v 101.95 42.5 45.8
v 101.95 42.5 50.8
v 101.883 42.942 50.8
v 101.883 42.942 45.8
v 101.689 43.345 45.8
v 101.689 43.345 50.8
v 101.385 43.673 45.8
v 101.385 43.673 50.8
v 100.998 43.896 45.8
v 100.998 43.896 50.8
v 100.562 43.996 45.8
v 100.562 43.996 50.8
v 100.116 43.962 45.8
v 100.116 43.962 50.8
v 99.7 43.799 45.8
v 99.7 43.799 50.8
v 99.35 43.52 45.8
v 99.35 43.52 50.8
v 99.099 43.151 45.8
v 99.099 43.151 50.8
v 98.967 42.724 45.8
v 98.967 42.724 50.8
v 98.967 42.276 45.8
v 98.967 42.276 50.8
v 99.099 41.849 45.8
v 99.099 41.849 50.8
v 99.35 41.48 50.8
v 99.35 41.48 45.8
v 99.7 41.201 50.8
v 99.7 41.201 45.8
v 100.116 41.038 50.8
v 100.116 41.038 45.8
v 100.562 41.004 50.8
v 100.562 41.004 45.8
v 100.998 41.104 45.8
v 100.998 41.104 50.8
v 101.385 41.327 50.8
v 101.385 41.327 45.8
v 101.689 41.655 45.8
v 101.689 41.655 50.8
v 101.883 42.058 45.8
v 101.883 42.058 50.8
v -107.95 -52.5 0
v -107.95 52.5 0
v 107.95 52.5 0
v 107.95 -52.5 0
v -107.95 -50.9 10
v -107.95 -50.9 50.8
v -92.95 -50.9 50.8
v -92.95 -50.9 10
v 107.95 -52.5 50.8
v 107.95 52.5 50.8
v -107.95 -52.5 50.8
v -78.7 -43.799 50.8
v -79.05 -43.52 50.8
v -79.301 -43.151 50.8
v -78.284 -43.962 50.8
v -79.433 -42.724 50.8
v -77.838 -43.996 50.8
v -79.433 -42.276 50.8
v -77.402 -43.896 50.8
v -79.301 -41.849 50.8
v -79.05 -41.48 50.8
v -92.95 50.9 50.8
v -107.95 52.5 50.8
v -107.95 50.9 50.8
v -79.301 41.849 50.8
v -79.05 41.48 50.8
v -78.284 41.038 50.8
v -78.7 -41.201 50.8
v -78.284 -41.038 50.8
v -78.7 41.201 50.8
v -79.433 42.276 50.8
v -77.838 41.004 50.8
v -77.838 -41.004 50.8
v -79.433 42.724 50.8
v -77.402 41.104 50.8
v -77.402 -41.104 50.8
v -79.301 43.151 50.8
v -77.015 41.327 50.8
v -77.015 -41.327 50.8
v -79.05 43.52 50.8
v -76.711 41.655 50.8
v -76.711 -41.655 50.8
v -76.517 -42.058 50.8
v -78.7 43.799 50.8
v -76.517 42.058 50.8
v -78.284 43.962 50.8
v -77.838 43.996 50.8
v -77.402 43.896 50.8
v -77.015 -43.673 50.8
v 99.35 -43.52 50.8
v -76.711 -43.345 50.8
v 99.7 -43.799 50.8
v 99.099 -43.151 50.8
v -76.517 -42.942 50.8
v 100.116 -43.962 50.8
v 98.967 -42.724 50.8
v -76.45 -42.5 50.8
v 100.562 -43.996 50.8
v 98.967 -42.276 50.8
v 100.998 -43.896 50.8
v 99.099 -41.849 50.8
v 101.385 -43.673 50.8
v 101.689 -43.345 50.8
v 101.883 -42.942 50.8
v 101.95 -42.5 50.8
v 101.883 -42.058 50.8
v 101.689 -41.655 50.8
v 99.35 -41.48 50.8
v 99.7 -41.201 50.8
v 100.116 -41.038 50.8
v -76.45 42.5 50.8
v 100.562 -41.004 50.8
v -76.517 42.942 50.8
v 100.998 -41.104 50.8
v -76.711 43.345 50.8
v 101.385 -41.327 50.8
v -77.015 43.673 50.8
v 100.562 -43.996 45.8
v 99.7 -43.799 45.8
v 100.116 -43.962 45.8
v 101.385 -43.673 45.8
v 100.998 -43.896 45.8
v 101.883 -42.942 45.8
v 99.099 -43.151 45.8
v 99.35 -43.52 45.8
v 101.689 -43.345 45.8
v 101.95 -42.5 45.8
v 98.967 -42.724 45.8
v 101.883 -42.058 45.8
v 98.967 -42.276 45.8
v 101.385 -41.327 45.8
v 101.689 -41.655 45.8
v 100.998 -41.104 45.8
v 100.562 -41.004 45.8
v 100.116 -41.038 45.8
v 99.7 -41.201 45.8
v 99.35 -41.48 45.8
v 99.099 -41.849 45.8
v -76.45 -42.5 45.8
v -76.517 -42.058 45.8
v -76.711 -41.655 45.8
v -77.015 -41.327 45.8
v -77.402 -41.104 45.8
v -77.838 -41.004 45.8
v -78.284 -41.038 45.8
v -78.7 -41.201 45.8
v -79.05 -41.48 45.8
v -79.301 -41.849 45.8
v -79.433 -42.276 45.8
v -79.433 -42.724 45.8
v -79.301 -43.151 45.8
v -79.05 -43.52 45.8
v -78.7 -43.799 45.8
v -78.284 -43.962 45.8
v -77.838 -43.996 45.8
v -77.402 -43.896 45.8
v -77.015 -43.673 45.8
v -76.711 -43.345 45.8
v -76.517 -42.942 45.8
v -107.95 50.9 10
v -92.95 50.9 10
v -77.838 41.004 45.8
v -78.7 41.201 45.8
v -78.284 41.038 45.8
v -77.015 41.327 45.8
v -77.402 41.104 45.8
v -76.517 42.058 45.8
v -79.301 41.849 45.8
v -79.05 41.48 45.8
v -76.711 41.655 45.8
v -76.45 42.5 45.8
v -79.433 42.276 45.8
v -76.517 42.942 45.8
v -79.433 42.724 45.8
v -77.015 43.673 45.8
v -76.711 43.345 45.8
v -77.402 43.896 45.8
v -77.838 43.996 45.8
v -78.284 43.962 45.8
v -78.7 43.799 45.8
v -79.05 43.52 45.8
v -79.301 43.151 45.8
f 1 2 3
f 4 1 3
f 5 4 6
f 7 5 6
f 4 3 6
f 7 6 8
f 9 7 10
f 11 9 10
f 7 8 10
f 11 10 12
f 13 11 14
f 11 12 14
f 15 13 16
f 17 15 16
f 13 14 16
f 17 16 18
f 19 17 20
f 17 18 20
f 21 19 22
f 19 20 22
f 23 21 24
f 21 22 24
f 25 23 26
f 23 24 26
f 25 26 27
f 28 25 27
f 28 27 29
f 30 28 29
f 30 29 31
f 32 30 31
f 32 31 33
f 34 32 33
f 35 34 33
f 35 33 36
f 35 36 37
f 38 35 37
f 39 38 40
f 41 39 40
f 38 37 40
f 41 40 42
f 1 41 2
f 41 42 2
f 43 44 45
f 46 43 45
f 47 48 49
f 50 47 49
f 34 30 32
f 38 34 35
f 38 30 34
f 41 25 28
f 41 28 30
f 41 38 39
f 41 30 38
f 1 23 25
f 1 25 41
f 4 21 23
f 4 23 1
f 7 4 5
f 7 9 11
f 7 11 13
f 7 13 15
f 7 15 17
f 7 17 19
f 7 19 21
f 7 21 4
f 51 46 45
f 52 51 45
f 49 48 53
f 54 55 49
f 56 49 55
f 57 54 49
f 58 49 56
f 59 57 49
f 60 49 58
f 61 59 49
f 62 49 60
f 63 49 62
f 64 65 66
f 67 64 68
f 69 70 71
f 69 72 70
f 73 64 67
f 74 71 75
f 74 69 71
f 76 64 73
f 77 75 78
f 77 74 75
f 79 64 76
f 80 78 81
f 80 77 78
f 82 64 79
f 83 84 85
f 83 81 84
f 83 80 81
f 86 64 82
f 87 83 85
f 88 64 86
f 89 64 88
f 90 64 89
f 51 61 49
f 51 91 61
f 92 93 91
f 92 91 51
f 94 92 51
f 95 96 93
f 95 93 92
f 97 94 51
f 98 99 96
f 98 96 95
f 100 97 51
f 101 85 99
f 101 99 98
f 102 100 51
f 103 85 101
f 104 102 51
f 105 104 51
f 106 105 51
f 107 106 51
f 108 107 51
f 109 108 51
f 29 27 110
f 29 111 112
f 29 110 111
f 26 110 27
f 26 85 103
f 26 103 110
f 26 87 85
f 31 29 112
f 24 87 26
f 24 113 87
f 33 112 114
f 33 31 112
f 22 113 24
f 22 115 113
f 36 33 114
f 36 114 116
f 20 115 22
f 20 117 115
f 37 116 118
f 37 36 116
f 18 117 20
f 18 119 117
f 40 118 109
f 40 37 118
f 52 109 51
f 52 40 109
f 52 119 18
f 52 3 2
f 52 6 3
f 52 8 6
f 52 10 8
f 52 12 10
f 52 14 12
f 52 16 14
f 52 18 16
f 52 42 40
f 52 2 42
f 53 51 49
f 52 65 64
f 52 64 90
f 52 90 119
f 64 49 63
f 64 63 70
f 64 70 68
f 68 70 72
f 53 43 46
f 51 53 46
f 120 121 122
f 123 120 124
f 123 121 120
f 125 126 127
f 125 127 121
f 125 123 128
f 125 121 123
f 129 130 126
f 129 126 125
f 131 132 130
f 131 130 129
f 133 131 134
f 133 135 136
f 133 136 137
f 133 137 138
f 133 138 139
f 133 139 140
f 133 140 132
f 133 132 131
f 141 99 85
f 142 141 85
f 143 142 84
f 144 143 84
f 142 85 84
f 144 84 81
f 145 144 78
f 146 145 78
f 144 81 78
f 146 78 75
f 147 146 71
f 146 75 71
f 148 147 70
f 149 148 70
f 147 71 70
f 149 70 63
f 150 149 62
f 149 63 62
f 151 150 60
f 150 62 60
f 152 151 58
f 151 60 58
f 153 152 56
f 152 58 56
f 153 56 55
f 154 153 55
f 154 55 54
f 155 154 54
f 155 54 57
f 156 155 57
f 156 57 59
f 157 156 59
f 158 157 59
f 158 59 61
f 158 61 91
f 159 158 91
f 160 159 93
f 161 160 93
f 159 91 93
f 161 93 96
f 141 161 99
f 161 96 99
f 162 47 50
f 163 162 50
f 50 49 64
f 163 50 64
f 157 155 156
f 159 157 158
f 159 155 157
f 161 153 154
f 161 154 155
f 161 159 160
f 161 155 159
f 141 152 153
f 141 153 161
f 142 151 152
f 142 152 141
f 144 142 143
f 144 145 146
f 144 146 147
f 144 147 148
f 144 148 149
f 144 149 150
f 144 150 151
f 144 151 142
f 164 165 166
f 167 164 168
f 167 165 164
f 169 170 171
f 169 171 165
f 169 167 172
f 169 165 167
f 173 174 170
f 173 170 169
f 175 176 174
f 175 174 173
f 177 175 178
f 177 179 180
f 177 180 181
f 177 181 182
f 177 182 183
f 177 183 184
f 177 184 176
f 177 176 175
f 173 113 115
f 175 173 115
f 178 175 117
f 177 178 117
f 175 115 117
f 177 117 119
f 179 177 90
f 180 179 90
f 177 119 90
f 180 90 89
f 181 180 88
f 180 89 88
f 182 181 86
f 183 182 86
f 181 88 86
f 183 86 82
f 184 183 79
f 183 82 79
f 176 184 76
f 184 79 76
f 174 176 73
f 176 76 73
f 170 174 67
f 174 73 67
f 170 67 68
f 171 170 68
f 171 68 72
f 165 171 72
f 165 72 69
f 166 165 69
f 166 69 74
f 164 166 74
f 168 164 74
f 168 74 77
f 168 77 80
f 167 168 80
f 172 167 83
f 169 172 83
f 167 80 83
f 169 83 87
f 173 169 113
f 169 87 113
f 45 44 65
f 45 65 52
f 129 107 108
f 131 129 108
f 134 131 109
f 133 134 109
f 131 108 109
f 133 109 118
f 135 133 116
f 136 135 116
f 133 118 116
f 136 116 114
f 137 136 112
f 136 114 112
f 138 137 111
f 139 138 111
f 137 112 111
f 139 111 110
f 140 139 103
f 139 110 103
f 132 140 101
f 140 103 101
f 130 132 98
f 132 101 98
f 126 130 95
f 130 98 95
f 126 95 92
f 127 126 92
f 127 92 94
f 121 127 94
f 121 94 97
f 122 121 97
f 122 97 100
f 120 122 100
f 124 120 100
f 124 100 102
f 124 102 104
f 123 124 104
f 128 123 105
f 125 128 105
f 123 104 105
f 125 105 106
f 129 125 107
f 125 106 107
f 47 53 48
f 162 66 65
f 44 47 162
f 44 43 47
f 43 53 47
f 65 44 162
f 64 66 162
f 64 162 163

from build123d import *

# Parameters (mm, degrees)
F0_W     = 215.9
F0_H     = 105
F1_DEPTH = 50.8
F2_R     = 1.5
F3_DEPTH = 5
F4_W     = 15
F4_H     = 101.8
F5_DEPTH = 40.8


with BuildPart() as f1:
    # F0 (on Top) → F1 (new body)
    with BuildSketch(Plane.XY):
        Rectangle(F0_W, F0_H)
    extrude(amount=F1_DEPTH)

    # F2 (on face) → F3 (cut)
    with BuildSketch(Plane.XY.offset(50.8)):
        with Locations((100.45, 42.5)):
            Circle(F2_R)
        with Locations((100.45, -42.5)):
            Circle(F2_R)
        with Locations((-77.95, -42.5)):
            Circle(F2_R)
        with Locations((-77.95, 42.5)):
            Circle(F2_R)
    extrude(amount=-F3_DEPTH, mode=Mode.SUBTRACT)

    # F4 (on face) → F5 (cut)
    with BuildSketch(Plane.XY.offset(50.8)):
        with Locations((-100.45, 0)):
            Rectangle(F4_W, F4_H)
    extrude(amount=-F5_DEPTH, mode=Mode.SUBTRACT)


solid = f1.part
